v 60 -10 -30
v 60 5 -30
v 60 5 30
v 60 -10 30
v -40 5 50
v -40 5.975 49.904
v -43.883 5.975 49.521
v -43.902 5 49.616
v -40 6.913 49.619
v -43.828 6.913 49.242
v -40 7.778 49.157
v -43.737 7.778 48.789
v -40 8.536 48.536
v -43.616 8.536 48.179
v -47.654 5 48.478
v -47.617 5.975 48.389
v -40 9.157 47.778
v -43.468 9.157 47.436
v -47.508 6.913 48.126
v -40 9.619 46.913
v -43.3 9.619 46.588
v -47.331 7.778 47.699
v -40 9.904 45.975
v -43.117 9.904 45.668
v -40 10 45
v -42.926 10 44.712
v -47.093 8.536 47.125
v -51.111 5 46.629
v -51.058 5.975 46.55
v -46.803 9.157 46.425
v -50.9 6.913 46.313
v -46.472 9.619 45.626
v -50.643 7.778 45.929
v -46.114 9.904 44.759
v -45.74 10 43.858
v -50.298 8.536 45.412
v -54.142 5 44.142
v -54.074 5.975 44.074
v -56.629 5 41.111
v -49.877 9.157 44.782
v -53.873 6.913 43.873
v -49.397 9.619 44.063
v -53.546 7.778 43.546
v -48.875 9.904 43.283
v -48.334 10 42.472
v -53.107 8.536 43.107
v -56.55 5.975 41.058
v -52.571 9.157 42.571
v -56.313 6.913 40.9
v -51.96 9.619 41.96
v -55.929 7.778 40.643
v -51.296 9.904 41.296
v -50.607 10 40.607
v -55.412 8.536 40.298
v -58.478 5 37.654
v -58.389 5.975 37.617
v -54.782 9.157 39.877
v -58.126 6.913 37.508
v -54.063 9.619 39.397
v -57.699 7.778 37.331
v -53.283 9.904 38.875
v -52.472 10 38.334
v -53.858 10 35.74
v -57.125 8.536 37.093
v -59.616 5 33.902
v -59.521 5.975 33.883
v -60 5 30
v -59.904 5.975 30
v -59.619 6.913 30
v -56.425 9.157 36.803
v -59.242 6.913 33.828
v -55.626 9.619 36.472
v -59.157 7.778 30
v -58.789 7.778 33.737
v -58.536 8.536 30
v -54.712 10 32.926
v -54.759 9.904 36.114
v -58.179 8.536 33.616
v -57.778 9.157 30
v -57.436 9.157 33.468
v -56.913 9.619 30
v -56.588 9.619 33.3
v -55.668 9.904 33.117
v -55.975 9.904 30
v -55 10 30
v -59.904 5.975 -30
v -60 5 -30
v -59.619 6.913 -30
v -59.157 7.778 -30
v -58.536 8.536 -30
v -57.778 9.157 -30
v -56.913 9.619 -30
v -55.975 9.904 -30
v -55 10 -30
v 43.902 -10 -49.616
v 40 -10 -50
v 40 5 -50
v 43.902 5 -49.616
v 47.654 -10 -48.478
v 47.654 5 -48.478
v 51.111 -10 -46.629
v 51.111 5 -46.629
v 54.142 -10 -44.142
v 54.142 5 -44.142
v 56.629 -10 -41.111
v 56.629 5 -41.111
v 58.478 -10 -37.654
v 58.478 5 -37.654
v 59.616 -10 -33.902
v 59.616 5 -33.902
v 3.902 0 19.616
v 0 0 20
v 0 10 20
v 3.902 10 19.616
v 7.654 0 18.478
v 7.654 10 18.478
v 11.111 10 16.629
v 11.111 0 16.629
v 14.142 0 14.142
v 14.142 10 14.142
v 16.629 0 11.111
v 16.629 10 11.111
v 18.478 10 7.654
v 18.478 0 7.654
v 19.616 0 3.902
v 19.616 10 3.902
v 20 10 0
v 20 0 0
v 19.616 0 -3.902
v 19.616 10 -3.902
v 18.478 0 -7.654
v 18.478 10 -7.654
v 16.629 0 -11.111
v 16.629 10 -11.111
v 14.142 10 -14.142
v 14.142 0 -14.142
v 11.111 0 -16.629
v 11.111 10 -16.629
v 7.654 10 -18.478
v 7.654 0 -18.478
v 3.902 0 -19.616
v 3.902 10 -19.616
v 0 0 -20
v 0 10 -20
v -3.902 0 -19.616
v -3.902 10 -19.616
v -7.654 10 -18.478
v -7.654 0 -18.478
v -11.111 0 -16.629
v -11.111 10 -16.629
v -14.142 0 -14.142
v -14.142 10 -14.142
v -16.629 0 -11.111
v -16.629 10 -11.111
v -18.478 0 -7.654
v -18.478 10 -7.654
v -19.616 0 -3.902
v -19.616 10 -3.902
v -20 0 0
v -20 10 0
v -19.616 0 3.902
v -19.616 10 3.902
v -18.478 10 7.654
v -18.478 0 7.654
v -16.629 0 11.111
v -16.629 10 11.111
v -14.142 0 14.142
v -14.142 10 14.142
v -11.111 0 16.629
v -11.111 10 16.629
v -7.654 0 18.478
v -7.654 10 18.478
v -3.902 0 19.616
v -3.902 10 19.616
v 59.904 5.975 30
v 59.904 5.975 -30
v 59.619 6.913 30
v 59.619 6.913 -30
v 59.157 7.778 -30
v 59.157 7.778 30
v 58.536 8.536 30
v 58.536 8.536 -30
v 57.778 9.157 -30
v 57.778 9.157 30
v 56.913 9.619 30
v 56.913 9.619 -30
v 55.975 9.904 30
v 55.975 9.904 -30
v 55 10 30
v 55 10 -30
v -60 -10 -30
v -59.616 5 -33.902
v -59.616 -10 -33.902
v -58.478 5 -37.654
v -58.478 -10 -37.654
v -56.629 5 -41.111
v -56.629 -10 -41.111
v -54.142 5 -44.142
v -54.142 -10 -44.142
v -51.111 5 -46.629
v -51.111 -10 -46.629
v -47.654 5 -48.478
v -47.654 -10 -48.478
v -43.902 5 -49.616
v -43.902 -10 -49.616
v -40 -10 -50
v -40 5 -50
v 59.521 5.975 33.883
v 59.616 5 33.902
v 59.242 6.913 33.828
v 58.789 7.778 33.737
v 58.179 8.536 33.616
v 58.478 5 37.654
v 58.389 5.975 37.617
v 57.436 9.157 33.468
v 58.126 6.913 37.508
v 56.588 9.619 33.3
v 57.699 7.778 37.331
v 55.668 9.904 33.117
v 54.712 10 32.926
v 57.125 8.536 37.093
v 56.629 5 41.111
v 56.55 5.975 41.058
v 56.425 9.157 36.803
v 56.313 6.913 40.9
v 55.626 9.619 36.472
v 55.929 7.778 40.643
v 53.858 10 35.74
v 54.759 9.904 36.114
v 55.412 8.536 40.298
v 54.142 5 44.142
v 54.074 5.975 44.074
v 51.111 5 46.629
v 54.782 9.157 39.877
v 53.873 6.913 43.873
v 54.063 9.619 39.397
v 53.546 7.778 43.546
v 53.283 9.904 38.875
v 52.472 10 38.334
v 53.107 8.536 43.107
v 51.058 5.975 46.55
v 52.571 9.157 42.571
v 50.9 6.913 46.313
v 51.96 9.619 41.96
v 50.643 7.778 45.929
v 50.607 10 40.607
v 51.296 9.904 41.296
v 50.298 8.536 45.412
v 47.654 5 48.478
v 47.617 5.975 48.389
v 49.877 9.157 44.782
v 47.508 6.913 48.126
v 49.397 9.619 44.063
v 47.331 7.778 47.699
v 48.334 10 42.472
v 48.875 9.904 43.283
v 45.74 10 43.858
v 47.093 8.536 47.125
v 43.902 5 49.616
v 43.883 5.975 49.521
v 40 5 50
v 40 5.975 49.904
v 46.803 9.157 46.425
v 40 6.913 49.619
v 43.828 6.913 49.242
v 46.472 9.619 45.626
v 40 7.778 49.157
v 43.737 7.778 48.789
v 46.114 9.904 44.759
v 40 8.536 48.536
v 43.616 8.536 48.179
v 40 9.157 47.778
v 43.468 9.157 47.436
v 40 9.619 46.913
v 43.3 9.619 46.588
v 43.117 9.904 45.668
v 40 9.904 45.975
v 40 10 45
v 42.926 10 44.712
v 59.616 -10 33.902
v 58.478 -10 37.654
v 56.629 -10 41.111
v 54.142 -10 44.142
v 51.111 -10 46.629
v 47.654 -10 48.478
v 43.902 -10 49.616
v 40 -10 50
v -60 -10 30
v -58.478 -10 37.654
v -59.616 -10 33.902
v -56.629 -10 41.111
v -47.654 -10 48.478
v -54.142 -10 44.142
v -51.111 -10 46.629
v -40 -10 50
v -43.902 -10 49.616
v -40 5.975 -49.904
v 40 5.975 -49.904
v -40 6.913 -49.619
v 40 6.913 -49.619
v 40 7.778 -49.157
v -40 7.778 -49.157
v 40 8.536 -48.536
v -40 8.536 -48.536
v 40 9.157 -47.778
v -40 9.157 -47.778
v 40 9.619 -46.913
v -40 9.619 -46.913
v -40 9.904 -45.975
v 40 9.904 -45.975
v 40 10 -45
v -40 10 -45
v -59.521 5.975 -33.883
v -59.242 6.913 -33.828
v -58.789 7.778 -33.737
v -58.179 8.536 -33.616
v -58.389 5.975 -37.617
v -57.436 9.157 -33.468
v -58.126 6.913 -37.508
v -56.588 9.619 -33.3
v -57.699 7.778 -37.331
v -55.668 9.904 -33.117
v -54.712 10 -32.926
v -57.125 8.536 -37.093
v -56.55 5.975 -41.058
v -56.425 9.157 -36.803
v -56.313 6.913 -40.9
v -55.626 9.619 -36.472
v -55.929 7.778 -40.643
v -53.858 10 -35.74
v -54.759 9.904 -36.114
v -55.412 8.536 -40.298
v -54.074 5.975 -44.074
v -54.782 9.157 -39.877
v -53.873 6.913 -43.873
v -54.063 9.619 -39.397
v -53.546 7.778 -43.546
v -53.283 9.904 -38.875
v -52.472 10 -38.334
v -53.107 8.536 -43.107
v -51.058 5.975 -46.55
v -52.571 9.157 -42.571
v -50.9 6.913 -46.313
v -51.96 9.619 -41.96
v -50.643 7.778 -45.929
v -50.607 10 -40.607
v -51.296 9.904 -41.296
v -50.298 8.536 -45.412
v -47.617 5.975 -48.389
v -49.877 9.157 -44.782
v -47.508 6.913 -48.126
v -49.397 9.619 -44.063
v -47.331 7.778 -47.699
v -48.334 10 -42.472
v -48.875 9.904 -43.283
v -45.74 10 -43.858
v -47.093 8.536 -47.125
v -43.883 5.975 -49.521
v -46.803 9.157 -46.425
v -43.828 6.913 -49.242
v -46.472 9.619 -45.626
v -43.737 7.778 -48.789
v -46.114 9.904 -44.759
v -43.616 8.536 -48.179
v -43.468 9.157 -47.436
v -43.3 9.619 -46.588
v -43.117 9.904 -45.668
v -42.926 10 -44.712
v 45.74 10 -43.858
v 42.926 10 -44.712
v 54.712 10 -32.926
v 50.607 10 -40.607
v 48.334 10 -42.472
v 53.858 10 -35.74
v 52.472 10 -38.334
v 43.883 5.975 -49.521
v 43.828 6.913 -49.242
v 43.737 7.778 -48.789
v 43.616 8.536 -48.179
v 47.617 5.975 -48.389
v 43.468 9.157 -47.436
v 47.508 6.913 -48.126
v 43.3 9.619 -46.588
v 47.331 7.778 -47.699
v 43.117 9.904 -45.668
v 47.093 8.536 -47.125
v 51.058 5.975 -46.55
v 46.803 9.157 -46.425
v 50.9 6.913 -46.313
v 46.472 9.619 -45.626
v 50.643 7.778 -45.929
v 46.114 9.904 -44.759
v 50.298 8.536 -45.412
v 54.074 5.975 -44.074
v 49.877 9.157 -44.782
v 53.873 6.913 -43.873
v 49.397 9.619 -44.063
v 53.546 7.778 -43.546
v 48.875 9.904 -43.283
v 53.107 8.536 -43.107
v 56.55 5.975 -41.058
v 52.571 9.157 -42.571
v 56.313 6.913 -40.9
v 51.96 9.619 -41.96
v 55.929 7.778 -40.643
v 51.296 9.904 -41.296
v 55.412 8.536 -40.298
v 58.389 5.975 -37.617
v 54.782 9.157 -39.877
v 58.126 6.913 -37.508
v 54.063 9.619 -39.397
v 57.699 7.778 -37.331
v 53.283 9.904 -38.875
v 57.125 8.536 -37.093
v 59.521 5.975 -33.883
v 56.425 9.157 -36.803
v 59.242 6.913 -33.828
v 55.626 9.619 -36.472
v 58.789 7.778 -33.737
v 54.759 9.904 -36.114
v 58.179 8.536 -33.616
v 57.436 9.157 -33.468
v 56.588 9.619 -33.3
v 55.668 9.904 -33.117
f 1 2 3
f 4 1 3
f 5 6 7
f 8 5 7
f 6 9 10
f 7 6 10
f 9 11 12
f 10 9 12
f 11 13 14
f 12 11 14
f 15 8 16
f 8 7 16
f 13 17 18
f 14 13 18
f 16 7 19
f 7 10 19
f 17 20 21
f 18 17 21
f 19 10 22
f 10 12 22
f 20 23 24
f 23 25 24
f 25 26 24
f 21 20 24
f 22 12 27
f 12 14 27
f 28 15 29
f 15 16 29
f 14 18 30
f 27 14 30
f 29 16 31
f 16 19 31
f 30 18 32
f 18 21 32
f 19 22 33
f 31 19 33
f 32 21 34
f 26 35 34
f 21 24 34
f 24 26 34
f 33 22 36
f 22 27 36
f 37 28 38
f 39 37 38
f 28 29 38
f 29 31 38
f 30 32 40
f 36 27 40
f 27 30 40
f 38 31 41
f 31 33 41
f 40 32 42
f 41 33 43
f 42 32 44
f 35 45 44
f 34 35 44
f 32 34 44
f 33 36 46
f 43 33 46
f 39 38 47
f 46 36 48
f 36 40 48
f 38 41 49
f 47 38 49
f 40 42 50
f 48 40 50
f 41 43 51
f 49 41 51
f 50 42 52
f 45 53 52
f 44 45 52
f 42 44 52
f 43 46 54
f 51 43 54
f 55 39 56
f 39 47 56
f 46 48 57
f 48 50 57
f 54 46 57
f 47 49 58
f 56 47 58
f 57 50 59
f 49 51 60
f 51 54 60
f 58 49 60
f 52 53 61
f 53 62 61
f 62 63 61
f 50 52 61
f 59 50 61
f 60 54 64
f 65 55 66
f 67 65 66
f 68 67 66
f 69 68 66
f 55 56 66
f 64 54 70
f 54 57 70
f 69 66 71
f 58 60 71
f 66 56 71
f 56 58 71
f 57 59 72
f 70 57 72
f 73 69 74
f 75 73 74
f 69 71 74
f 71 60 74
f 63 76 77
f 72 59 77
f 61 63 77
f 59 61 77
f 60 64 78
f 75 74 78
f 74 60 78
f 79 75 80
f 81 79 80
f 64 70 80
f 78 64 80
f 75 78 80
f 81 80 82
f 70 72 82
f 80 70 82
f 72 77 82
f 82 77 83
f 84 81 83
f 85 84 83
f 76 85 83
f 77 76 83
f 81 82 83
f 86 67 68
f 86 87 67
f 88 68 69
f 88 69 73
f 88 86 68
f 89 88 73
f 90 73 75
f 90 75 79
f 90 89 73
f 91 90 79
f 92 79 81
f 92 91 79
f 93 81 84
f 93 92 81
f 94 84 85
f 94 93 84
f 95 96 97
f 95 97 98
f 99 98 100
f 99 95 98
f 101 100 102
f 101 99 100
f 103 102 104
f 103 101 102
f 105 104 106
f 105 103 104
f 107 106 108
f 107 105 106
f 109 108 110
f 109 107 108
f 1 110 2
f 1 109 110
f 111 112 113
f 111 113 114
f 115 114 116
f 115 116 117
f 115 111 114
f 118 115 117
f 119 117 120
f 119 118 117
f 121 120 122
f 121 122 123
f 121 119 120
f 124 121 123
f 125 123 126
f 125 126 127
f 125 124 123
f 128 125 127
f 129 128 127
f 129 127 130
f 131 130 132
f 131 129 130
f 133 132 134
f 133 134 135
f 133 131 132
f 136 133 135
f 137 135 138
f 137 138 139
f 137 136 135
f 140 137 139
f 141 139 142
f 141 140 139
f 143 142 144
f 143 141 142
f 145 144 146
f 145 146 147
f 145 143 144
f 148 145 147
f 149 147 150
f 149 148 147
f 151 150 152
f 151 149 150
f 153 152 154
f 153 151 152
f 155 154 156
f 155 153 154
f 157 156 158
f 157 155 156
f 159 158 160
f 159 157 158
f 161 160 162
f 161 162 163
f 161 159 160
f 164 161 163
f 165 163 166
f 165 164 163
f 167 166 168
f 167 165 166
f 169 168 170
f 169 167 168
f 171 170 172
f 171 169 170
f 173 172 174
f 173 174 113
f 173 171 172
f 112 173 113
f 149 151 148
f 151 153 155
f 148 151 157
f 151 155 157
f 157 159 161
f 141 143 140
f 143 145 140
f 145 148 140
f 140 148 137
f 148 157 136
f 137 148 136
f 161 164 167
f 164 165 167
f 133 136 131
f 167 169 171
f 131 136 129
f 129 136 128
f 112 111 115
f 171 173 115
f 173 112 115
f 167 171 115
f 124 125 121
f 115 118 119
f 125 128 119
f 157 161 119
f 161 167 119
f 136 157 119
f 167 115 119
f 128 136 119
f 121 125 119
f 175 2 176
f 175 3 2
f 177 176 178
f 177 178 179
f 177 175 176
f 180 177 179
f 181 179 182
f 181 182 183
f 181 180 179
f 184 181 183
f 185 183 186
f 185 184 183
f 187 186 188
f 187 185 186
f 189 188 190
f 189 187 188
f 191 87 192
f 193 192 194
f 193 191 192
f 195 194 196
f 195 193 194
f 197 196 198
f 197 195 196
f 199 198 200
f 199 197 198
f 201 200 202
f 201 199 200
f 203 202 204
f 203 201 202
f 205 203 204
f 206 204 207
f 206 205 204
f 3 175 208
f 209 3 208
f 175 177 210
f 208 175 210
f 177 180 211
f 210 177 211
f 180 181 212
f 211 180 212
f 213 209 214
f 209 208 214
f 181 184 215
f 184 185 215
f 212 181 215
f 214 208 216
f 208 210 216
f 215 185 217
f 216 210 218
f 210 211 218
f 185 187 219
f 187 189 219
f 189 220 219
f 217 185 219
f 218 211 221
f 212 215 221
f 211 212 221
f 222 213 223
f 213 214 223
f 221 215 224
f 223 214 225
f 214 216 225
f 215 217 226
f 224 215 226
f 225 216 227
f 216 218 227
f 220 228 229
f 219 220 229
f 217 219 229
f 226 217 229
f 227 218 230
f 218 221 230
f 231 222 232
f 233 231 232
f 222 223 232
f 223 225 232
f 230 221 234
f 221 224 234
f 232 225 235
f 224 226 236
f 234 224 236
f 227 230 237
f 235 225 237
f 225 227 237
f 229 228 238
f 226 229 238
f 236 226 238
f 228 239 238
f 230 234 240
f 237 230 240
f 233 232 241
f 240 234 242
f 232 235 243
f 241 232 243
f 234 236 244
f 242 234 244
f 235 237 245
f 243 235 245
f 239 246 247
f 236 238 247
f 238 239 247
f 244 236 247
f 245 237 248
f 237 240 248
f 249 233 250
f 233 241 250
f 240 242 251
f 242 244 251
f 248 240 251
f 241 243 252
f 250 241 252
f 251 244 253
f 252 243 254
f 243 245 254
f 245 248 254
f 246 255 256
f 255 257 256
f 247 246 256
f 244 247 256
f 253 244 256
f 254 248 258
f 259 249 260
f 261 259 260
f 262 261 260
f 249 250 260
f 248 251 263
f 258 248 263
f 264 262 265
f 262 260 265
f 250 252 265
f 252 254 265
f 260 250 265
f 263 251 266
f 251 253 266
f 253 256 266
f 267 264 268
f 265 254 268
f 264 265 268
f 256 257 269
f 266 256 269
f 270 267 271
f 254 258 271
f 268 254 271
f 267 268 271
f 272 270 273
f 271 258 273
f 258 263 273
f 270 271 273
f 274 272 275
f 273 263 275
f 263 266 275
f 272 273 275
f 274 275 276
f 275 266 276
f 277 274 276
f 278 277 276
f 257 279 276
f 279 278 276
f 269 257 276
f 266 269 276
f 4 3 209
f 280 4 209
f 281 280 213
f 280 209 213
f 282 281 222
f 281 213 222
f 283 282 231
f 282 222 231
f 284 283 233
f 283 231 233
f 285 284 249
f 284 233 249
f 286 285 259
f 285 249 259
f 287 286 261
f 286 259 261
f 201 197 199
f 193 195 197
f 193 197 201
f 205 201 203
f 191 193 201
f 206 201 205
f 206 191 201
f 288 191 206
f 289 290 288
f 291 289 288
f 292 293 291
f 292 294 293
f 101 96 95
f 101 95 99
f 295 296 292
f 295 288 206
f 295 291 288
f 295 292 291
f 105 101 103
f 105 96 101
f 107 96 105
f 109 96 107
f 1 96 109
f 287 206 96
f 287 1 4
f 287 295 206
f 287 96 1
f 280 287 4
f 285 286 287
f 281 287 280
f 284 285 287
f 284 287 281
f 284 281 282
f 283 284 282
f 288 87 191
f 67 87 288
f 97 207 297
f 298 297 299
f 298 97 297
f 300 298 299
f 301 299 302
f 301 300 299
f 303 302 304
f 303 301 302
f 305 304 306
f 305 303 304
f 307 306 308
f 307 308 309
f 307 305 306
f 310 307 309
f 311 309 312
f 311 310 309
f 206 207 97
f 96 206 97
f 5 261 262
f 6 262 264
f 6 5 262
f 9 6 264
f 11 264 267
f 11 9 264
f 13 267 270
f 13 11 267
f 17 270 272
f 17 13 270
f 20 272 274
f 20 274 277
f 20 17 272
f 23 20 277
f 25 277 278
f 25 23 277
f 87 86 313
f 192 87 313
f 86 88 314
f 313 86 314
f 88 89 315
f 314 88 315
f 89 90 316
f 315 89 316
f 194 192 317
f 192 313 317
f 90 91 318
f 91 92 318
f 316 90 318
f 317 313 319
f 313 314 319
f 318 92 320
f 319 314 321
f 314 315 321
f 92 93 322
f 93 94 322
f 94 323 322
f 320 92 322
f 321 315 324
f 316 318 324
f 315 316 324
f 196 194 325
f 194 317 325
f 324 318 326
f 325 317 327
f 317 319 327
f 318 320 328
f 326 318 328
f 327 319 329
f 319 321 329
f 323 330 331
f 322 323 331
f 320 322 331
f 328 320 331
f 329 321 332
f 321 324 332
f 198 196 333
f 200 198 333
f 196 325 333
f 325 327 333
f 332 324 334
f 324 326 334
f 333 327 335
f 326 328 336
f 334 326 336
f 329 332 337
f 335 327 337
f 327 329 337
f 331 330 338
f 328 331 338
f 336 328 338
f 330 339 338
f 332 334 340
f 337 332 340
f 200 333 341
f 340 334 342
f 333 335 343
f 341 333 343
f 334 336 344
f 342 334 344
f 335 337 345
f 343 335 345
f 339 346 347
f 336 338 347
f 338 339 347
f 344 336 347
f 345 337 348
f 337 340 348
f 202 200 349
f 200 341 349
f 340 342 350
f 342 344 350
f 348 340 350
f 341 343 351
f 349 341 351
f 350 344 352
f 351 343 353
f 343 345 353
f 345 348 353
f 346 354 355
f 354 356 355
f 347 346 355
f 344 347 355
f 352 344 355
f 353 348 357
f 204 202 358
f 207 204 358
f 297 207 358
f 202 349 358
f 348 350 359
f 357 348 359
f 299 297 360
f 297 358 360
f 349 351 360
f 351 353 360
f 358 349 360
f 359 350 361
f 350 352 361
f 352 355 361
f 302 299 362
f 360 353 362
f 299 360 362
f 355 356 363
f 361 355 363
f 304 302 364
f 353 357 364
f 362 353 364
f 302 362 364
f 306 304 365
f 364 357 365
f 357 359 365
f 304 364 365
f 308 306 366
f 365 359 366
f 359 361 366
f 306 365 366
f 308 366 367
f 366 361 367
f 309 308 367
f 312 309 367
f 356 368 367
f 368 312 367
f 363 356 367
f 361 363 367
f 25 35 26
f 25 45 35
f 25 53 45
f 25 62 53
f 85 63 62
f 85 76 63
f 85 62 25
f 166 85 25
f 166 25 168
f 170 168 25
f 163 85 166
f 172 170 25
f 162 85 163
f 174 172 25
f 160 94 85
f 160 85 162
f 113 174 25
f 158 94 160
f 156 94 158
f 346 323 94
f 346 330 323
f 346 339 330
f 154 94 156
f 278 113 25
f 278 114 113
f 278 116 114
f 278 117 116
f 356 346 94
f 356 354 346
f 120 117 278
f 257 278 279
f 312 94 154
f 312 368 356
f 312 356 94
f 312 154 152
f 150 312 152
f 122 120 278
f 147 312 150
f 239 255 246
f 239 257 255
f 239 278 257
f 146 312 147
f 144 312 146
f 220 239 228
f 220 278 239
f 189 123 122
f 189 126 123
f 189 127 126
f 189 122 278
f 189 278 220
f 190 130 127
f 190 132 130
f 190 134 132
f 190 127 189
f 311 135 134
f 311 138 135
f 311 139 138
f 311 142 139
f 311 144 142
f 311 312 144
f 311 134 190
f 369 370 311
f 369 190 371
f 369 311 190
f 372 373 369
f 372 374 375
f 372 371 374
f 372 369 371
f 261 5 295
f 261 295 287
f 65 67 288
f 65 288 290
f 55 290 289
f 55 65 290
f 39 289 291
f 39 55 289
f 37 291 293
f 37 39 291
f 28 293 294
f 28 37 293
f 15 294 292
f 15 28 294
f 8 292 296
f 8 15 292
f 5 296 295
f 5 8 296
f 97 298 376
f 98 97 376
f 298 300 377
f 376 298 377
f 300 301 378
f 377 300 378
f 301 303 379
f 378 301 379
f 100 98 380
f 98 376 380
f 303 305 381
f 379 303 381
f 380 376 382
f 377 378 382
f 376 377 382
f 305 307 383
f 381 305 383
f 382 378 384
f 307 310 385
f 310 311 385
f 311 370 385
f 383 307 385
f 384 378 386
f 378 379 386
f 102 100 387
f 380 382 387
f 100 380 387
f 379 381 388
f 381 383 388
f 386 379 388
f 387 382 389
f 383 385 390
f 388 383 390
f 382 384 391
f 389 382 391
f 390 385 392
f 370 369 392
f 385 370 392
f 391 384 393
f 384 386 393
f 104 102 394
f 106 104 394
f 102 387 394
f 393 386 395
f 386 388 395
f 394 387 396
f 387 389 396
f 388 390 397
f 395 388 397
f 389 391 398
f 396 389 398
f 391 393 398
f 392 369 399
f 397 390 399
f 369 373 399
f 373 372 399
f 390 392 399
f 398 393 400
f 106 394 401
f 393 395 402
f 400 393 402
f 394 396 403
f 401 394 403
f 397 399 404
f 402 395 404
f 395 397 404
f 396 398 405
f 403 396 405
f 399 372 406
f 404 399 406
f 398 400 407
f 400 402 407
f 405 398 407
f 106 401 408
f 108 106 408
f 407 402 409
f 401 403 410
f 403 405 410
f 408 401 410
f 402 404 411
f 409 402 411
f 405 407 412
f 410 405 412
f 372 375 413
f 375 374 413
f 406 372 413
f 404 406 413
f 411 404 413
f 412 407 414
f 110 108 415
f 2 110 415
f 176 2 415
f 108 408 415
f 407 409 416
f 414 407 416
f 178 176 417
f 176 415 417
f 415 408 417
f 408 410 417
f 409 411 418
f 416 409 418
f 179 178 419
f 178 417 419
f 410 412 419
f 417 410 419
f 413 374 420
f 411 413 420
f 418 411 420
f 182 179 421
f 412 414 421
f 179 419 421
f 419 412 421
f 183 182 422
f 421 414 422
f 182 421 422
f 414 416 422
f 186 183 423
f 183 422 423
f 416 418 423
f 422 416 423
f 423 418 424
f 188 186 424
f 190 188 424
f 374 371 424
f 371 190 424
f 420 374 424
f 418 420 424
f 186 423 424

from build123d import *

# Parameters (mm, degrees)
SKETCH2_W           = 120
SKETCH2_H           = 100
SKETCH2_R           = 20
BOSS_EXTRUDE1_DEPTH = 10
SKETCH3_W           = 120
SKETCH3_H           = 100
BOSS_EXTRUDE2_DEPTH = 10
FILLET1_R           = 20
FILLET2_R           = 5


with BuildPart() as part:
    # Sketch2 → Boss-Extrude1 (new body)
    with BuildSketch(Plane(origin=(0, 0, 0), x_dir=(1, 0, 0), z_dir=(0, 1, 0))):
        Rectangle(SKETCH2_W, SKETCH2_H)
        with Locations(Location((0, 0, 0), (0, 0, 270))):
            Circle(SKETCH2_R, mode=Mode.SUBTRACT)
    extrude(amount=BOSS_EXTRUDE1_DEPTH)

    # Sketch3 → Boss-Extrude2 (add)
    with BuildSketch(Plane.XZ):
        Rectangle(SKETCH3_W, SKETCH3_H)
    extrude(amount=BOSS_EXTRUDE2_DEPTH)

    # Fillet1
    fillet1_edges = [part.edges().sort_by_distance(p)[0] for p in [
        (60, 0, 50),
        (-60, 0, 50),
        (-60, 0, -50),
        (60, 0, -50),
    ]]
    fillet(fillet1_edges, radius=FILLET1_R)

    # Fillet2
    fillet2_edges = [part.edges().sort_by_distance(p)[0] for p in [
        (-60, 10, 0),
        (0, 10, -50),
        (60, 10, 0),
        (0, 10, 50),
        (54.142135624, 10, 44.142135624),
        (54.142135624, 10, -44.142135624),
        (-54.142135624, 10, 44.142135624),
        (-54.142135624, 10, -44.142135624),
    ]]
    fillet(fillet2_edges, radius=FILLET2_R)


solid = part.part
